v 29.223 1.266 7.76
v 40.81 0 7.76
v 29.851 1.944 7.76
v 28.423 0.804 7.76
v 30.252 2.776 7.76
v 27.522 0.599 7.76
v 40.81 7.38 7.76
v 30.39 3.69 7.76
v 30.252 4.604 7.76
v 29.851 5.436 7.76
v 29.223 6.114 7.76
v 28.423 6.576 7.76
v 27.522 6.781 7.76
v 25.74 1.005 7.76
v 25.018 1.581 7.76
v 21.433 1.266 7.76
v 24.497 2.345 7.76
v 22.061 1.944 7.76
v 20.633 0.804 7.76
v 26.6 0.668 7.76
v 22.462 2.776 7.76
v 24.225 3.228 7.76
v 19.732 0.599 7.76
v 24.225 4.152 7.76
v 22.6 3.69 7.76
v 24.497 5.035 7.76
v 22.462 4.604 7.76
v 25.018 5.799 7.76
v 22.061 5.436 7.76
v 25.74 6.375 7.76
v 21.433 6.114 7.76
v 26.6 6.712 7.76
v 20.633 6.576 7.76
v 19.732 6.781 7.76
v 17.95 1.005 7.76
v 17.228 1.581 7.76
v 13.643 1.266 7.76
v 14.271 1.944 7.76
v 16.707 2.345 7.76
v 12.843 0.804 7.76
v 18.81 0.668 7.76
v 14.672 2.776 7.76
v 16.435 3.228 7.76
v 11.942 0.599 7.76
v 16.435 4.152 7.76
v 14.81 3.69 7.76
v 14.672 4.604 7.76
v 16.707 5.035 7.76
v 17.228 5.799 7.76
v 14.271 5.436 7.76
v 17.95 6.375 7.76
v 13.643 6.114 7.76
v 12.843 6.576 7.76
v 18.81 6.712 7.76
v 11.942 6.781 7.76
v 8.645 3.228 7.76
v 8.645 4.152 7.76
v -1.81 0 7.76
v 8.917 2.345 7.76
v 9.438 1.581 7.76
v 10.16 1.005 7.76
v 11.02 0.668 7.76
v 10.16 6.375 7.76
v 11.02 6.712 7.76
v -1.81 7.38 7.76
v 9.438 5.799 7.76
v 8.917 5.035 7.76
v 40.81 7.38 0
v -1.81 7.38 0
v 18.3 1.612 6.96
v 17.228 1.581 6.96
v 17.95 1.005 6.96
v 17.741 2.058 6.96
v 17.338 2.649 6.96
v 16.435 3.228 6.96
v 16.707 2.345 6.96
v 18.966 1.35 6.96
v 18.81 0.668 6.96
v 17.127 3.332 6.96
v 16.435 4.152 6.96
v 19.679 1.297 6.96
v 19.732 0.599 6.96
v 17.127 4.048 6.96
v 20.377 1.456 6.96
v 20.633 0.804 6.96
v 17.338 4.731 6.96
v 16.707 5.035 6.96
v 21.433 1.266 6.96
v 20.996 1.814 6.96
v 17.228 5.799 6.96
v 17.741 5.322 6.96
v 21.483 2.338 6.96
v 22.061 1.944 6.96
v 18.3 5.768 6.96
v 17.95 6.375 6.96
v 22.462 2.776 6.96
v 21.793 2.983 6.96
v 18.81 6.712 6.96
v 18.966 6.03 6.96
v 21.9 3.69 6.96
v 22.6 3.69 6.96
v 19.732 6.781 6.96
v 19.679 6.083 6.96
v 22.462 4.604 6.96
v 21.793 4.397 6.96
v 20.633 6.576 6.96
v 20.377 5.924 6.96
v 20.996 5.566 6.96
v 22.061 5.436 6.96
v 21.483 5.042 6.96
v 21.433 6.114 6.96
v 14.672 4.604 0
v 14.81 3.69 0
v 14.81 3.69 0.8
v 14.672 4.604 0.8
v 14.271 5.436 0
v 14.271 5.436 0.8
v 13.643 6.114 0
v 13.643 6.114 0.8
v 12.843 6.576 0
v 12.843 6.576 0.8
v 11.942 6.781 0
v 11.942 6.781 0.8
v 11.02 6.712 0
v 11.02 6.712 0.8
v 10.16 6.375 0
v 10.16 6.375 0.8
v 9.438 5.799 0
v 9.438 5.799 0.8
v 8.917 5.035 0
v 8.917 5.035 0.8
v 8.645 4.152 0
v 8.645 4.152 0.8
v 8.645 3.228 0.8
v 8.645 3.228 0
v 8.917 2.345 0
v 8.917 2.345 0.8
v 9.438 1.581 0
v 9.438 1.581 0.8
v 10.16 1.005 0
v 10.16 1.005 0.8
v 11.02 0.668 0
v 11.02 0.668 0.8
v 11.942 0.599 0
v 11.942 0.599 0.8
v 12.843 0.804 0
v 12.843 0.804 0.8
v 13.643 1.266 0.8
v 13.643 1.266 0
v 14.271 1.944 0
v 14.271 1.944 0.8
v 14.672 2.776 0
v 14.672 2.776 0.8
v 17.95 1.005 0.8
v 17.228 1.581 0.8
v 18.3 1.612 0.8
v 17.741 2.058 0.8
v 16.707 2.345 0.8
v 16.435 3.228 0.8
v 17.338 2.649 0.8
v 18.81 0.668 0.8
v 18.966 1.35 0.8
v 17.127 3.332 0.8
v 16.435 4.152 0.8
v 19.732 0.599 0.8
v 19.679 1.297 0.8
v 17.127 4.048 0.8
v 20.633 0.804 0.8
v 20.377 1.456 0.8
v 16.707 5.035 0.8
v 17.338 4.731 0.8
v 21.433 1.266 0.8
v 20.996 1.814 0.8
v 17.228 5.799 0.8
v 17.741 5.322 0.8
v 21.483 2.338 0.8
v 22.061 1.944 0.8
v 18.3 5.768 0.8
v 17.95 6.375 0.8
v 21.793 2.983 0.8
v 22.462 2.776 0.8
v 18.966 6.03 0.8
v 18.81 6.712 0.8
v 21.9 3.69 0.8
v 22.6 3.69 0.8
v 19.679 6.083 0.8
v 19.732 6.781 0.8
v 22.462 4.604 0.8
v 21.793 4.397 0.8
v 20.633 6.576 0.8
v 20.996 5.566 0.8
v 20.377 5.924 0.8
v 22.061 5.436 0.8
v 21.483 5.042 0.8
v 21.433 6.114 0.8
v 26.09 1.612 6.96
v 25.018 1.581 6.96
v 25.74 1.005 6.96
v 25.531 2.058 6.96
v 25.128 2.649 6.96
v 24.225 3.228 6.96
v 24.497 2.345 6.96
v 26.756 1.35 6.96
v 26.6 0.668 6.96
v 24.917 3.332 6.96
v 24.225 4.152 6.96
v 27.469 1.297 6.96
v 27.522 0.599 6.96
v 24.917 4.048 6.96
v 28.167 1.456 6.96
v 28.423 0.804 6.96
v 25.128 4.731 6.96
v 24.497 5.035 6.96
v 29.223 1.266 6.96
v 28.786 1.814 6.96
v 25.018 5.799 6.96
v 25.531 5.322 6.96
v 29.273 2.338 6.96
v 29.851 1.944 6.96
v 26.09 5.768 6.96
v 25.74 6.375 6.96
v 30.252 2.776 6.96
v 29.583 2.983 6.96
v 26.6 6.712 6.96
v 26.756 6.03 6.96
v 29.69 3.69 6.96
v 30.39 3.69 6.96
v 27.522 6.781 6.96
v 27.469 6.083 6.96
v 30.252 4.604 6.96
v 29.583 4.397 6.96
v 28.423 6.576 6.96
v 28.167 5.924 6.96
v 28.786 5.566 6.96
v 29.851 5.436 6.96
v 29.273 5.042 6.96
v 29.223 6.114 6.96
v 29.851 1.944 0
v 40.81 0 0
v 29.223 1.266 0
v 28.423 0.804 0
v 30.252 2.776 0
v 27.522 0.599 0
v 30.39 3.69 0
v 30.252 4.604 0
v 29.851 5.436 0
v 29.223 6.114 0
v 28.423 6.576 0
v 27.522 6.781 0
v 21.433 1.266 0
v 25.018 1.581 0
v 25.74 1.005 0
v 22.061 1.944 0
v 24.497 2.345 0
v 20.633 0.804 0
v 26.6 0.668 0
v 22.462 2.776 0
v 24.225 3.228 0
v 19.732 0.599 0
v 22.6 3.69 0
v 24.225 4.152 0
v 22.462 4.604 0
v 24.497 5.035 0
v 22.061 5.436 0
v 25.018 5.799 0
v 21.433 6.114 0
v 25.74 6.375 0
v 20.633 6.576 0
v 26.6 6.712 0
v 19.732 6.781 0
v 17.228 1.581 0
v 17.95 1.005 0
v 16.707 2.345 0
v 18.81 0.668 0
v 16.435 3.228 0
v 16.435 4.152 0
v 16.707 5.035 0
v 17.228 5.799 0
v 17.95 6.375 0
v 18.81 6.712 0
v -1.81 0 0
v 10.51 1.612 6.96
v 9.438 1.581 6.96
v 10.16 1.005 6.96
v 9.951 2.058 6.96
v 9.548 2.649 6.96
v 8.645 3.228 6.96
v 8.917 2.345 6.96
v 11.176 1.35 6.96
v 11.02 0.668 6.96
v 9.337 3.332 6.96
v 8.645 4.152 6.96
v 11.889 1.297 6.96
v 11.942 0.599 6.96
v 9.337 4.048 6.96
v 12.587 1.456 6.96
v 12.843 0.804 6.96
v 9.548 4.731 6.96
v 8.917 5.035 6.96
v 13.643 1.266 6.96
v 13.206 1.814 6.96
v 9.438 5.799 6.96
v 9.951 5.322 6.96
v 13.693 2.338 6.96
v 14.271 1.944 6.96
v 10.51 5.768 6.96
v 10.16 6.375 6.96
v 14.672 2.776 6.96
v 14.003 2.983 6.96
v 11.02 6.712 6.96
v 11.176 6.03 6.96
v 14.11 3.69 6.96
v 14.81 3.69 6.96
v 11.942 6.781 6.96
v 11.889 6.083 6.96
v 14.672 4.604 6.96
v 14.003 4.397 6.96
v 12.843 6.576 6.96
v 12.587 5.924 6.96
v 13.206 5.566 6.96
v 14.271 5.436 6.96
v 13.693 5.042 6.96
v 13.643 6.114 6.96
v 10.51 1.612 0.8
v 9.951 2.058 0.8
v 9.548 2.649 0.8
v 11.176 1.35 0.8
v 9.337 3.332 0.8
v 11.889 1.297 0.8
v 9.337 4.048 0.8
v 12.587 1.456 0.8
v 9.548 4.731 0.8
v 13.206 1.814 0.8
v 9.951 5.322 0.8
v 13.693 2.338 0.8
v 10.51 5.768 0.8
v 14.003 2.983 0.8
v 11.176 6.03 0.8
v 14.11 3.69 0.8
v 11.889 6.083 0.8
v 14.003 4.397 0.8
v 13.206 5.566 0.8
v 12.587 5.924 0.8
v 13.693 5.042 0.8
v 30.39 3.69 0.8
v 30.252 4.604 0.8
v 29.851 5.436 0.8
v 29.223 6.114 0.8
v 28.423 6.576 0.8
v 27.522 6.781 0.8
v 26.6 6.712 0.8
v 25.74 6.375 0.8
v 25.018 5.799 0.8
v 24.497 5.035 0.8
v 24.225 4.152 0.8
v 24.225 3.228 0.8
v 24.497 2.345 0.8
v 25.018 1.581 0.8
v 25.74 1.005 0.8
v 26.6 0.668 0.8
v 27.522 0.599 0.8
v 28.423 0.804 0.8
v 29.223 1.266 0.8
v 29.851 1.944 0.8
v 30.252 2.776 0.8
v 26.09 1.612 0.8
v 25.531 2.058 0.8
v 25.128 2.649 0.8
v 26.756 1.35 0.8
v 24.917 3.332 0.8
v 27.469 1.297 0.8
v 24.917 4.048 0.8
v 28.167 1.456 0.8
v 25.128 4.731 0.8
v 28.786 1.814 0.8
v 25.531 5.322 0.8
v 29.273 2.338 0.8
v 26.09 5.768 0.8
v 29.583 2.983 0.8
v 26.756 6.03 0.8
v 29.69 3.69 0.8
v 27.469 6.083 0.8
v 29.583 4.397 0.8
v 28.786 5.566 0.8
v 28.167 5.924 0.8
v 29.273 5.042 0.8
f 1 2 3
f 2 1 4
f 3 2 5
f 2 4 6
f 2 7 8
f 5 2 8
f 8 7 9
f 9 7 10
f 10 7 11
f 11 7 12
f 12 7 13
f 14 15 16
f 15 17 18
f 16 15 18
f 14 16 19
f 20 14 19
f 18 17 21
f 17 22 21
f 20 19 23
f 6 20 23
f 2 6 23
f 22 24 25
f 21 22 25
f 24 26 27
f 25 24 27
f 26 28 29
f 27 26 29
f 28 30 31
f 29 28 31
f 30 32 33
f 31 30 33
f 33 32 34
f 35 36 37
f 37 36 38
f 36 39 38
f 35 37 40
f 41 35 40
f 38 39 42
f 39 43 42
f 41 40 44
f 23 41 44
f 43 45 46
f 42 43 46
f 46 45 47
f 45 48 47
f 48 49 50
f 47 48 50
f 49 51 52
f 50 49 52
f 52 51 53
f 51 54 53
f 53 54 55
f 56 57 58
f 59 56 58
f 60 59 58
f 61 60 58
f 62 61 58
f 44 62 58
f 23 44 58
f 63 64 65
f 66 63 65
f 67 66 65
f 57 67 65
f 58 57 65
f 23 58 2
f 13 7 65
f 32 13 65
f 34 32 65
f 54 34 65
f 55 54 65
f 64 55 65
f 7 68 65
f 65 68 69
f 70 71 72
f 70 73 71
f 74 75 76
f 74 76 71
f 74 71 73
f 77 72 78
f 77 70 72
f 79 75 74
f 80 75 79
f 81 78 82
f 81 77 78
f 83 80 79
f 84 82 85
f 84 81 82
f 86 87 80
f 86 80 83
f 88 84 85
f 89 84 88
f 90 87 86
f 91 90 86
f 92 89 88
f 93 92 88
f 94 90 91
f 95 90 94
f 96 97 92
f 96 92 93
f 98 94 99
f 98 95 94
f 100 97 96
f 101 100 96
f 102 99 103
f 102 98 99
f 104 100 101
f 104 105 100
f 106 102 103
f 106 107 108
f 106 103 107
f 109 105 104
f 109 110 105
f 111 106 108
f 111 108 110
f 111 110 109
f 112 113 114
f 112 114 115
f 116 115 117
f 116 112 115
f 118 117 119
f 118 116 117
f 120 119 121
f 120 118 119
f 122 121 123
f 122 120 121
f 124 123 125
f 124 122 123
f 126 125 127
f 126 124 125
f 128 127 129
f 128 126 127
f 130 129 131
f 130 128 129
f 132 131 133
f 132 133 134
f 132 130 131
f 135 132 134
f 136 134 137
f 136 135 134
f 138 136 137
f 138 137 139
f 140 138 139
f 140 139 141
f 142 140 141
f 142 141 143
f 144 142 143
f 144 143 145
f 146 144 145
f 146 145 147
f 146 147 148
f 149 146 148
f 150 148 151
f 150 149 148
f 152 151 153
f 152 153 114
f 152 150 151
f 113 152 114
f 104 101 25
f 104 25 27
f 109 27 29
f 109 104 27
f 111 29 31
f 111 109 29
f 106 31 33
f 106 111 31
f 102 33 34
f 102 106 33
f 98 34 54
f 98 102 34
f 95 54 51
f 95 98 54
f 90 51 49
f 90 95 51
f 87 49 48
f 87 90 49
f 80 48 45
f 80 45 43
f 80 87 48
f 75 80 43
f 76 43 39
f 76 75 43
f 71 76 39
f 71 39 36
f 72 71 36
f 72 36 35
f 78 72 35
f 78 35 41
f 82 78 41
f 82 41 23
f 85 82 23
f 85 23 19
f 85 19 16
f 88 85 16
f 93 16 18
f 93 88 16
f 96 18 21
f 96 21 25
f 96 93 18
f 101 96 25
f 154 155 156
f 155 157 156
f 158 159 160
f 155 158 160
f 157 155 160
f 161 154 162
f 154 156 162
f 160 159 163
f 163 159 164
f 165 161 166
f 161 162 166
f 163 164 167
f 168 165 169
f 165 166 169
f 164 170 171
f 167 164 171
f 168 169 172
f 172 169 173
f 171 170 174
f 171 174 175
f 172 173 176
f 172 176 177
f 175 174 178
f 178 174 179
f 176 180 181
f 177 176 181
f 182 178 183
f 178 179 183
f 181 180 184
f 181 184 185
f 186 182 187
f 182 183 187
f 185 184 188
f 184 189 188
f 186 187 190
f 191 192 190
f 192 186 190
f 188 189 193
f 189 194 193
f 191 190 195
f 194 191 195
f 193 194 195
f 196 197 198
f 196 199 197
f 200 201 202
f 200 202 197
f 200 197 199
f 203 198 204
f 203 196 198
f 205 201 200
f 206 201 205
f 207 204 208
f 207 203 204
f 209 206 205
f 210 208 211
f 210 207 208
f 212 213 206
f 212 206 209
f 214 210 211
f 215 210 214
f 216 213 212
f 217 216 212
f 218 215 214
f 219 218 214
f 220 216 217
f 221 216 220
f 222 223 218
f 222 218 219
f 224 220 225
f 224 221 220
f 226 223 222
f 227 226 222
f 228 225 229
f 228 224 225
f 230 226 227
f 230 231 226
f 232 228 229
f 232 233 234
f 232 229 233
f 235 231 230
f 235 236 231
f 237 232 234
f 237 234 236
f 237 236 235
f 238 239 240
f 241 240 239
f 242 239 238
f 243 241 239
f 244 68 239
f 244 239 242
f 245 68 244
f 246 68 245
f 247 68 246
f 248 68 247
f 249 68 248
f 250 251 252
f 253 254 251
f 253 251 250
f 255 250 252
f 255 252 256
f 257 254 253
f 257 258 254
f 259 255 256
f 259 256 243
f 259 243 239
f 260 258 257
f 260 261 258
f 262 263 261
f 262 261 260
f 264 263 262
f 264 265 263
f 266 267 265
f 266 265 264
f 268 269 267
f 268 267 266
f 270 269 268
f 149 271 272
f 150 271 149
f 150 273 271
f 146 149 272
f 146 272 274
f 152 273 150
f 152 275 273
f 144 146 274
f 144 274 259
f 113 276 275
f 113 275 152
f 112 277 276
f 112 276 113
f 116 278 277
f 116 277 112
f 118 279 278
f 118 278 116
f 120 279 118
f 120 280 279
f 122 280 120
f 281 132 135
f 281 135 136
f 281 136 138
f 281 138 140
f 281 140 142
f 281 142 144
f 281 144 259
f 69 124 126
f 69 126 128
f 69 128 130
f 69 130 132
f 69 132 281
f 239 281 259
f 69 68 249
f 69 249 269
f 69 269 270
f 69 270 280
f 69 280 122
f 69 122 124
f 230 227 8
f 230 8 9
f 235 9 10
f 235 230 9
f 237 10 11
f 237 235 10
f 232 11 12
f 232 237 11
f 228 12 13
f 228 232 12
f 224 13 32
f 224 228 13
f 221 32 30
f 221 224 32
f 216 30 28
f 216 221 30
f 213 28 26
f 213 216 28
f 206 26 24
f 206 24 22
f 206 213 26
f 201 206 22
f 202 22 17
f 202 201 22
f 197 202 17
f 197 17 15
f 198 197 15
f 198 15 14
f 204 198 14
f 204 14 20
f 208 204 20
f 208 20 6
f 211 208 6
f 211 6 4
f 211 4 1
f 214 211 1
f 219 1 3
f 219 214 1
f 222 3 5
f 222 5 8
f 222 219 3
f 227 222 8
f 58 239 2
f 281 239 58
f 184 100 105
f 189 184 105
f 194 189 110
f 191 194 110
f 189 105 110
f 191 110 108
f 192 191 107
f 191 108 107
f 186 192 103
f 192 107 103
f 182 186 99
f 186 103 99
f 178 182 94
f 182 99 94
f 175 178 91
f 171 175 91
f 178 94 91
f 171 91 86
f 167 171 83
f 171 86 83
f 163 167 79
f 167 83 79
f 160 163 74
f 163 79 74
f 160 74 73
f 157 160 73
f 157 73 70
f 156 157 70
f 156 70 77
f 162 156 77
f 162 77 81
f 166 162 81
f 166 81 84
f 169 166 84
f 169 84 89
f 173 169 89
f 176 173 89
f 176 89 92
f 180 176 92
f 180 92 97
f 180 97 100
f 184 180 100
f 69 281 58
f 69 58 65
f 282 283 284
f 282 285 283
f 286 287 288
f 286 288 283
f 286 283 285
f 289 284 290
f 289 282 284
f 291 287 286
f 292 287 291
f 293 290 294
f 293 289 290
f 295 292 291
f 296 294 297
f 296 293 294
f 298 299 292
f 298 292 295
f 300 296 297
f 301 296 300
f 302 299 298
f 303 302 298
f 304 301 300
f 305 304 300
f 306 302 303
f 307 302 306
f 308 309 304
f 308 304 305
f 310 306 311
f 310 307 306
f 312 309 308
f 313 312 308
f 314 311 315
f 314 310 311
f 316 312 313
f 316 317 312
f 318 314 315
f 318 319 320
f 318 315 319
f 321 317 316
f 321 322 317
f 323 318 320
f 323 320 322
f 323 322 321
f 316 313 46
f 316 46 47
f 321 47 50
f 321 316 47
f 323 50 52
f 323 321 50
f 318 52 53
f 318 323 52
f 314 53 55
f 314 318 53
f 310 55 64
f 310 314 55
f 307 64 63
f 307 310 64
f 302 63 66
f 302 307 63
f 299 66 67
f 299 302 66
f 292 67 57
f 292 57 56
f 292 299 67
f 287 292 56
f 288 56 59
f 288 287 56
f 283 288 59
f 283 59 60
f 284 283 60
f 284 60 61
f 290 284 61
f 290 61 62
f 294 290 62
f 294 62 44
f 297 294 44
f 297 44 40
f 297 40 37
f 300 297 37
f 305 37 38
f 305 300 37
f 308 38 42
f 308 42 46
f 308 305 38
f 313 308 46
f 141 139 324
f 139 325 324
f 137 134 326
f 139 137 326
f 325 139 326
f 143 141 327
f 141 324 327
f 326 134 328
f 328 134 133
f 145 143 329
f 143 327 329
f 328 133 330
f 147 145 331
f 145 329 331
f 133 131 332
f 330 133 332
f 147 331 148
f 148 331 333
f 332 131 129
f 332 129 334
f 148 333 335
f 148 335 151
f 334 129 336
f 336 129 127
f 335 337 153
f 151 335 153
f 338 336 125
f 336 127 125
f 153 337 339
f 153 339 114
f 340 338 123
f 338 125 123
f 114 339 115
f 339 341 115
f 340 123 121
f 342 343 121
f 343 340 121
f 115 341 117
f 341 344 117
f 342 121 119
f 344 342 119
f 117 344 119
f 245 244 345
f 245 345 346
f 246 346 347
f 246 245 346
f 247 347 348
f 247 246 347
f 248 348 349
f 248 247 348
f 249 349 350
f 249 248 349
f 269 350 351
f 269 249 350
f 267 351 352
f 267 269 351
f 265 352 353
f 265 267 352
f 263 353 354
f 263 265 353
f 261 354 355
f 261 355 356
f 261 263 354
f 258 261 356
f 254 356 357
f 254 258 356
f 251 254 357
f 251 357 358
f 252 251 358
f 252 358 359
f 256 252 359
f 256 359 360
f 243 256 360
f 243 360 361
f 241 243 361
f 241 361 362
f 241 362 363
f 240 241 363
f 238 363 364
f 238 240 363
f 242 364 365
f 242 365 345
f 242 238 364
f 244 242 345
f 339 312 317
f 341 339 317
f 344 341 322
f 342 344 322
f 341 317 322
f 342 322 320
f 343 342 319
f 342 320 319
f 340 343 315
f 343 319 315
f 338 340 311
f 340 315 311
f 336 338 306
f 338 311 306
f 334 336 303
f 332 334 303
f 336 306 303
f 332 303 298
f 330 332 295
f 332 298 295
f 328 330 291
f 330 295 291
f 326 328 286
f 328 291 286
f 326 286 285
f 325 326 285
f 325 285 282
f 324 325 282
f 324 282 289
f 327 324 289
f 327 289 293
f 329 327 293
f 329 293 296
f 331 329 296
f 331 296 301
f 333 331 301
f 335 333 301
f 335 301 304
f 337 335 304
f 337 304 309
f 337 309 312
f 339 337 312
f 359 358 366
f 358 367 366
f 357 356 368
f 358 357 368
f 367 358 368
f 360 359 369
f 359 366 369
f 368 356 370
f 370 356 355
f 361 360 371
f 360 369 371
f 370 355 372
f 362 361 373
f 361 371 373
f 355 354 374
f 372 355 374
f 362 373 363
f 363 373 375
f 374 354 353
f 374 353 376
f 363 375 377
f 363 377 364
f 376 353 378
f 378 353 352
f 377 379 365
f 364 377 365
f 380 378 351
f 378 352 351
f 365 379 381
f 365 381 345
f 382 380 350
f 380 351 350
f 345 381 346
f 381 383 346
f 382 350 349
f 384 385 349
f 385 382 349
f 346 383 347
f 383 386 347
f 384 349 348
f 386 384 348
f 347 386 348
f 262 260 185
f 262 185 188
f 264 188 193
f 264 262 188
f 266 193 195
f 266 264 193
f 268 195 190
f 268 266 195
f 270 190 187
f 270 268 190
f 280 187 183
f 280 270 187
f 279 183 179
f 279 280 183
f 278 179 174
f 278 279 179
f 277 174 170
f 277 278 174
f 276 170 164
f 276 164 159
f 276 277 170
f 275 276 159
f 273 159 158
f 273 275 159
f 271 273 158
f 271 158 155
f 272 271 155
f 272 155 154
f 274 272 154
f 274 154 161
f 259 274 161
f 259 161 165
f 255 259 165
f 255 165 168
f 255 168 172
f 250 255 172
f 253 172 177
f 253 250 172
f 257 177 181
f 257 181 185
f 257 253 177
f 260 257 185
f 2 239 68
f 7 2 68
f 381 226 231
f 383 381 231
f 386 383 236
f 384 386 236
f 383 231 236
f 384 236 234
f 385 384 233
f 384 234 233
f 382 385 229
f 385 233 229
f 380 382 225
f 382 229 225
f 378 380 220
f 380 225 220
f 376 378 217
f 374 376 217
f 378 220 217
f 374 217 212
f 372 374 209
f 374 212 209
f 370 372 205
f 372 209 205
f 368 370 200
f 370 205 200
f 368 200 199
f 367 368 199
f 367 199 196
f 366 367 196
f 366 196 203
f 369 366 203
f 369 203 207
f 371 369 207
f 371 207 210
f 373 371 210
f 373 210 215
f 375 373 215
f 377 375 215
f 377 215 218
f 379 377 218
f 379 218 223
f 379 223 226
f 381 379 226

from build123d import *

# Parameters (mm, degrees)
SKETCH1_W                = 39
SKETCH1_H                = 7.38
BOSS_EXTRUDE1_DEPTH      = 7.76
SKETCH2_R                = 2.4
CUT_EXTRUDE1_DEPTH       = 7.76
CUT_EXTRUDE2_OUTLINE_R   = 3.1
CUT_EXTRUDE2_OUTLINE_R_2 = 2.4
CUT_EXTRUDE2_DEPTH       = 0.8
CUT_EXTRUDE3_START       = 6.96
CUT_EXTRUDE3_OUTLINE_R   = 3.1
CUT_EXTRUDE3_OUTLINE_R_2 = 2.4
CUT_EXTRUDE3_DEPTH       = 0.8
LPATTERN3_COUNT          = 3
LPATTERN3_PITCH          = 7.79
LPATTERN6_COUNT          = 3
LPATTERN6_PITCH          = 7.79
FILLET1_R                = 3.69
FILLET2_R                = 3.69
FILLET3_R                = 3.69
FILLET4_R                = 3.69
BOSS_EXTRUDE2_START      = -7.76
SKETCH3_R                = 3.1
BOSS_EXTRUDE2_DEPTH      = 7.76
SKETCH4_R                = 3.1
BOSS_EXTRUDE3_DEPTH      = 7.76
SKETCH5_W                = 5.5
SKETCH5_H                = 7.38
BOSS_EXTRUDE5_DEPTH      = 7.76


# Read off the part's stored shape, not the designer's step: Cut-Extrude2, Cut-Extrude3
with BuildPart() as part:
    # Sketch1 → Boss-Extrude1 (new body)
    with BuildSketch(Plane.XY):
        with Locations((19.5, 3.69)):
            Rectangle(SKETCH1_W, SKETCH1_H)
    extrude(amount=BOSS_EXTRUDE1_DEPTH)

    # Sketch2 → Cut-Extrude1 (cut)
    with BuildSketch(Plane.XY.offset(7.76)):
        with Locations((19.5, 3.69)):
            Circle(SKETCH2_R)
    cut_extrude1 = extrude(amount=-CUT_EXTRUDE1_DEPTH, mode=Mode.SUBTRACT)

    # Cut-Extrude2 outline → Cut-Extrude2 (cut)
    with BuildSketch(Plane.XY):
        with Locations((19.5, 3.69)):
            Circle(CUT_EXTRUDE2_OUTLINE_R)
        with Locations((19.5, 3.69)):
            Circle(CUT_EXTRUDE2_OUTLINE_R_2, mode=Mode.SUBTRACT)
    cut_extrude2 = extrude(amount=CUT_EXTRUDE2_DEPTH, mode=Mode.SUBTRACT)

    # Cut-Extrude3 outline → Cut-Extrude3 (cut)
    with BuildSketch(Plane.XY.offset(CUT_EXTRUDE3_START)):
        with Locations((19.5, 3.69)):
            Circle(CUT_EXTRUDE3_OUTLINE_R)
        with Locations((19.5, 3.69)):
            Circle(CUT_EXTRUDE3_OUTLINE_R_2, mode=Mode.SUBTRACT)
    cut_extrude3 = extrude(amount=CUT_EXTRUDE3_DEPTH, mode=Mode.SUBTRACT)

    # LPattern3: Cut-Extrude1, Cut-Extrude2, Cut-Extrude3 ×3
    with Locations(*[(-i * LPATTERN3_PITCH, 0, 0) for i in range(1, LPATTERN3_COUNT)]):
        add(cut_extrude1, mode=Mode.SUBTRACT)
        add(cut_extrude2, mode=Mode.SUBTRACT)
        add(cut_extrude3, mode=Mode.SUBTRACT)

    # LPattern6: Cut-Extrude1, Cut-Extrude2, Cut-Extrude3 ×3
    with Locations(*[(i * LPATTERN6_PITCH, 0, 0) for i in range(1, LPATTERN6_COUNT)]):
        add(cut_extrude1, mode=Mode.SUBTRACT)
        add(cut_extrude2, mode=Mode.SUBTRACT)
        add(cut_extrude3, mode=Mode.SUBTRACT)

    # Fillet1
    fillet1_edges = [part.edges().sort_by_distance(p)[0] for p in [
        (0, 7.38, 3.88),
    ]]
    fillet(fillet1_edges, radius=FILLET1_R)

    # Fillet2
    fillet2_edges = [part.edges().sort_by_distance(p)[0] for p in [
        (0, 0, 3.88),
    ]]
    fillet(fillet2_edges, radius=FILLET2_R - 0.0001)  # a hair under: the kernel refuses the full size

    # Fillet3
    fillet3_edges = [part.edges().sort_by_distance(p)[0] for p in [
        (39, 7.38, 3.88),
    ]]
    fillet(fillet3_edges, radius=FILLET3_R)

    # Fillet4
    fillet4_edges = [part.edges().sort_by_distance(p)[0] for p in [
        (39, 0, 3.88),
    ]]
    fillet(fillet4_edges, radius=FILLET4_R - 0.0001)  # a hair under: the kernel refuses the full size

    # Sketch3 → Boss-Extrude2 (add)
    with BuildSketch(Plane.XY.offset(7.76).offset(BOSS_EXTRUDE2_START)):
        with Locations((3.92, 3.69)):
            Circle(SKETCH3_R)
    extrude(amount=BOSS_EXTRUDE2_DEPTH)

    # Sketch4 → Boss-Extrude3 (add)
    with BuildSketch(Plane(origin=(0, 0, 0), x_dir=(-1, 0, 0), z_dir=(0, 0, -1))):
        with Locations((-35.08, 3.69)):
            Circle(SKETCH4_R)
    extrude(amount=-BOSS_EXTRUDE3_DEPTH)

    # Sketch5 → Boss-Extrude5 (add)
    with BuildSketch(Plane(origin=(0, 0, 0), x_dir=(-1, 0, 0), z_dir=(0, 0, -1))):
        with Locations((-38.06, 3.69)):
            Rectangle(SKETCH5_W, SKETCH5_H)
        with Locations((-0.94, 3.69)):
            Rectangle(SKETCH5_W, SKETCH5_H)
    extrude(amount=-BOSS_EXTRUDE5_DEPTH)


solid = part.part
